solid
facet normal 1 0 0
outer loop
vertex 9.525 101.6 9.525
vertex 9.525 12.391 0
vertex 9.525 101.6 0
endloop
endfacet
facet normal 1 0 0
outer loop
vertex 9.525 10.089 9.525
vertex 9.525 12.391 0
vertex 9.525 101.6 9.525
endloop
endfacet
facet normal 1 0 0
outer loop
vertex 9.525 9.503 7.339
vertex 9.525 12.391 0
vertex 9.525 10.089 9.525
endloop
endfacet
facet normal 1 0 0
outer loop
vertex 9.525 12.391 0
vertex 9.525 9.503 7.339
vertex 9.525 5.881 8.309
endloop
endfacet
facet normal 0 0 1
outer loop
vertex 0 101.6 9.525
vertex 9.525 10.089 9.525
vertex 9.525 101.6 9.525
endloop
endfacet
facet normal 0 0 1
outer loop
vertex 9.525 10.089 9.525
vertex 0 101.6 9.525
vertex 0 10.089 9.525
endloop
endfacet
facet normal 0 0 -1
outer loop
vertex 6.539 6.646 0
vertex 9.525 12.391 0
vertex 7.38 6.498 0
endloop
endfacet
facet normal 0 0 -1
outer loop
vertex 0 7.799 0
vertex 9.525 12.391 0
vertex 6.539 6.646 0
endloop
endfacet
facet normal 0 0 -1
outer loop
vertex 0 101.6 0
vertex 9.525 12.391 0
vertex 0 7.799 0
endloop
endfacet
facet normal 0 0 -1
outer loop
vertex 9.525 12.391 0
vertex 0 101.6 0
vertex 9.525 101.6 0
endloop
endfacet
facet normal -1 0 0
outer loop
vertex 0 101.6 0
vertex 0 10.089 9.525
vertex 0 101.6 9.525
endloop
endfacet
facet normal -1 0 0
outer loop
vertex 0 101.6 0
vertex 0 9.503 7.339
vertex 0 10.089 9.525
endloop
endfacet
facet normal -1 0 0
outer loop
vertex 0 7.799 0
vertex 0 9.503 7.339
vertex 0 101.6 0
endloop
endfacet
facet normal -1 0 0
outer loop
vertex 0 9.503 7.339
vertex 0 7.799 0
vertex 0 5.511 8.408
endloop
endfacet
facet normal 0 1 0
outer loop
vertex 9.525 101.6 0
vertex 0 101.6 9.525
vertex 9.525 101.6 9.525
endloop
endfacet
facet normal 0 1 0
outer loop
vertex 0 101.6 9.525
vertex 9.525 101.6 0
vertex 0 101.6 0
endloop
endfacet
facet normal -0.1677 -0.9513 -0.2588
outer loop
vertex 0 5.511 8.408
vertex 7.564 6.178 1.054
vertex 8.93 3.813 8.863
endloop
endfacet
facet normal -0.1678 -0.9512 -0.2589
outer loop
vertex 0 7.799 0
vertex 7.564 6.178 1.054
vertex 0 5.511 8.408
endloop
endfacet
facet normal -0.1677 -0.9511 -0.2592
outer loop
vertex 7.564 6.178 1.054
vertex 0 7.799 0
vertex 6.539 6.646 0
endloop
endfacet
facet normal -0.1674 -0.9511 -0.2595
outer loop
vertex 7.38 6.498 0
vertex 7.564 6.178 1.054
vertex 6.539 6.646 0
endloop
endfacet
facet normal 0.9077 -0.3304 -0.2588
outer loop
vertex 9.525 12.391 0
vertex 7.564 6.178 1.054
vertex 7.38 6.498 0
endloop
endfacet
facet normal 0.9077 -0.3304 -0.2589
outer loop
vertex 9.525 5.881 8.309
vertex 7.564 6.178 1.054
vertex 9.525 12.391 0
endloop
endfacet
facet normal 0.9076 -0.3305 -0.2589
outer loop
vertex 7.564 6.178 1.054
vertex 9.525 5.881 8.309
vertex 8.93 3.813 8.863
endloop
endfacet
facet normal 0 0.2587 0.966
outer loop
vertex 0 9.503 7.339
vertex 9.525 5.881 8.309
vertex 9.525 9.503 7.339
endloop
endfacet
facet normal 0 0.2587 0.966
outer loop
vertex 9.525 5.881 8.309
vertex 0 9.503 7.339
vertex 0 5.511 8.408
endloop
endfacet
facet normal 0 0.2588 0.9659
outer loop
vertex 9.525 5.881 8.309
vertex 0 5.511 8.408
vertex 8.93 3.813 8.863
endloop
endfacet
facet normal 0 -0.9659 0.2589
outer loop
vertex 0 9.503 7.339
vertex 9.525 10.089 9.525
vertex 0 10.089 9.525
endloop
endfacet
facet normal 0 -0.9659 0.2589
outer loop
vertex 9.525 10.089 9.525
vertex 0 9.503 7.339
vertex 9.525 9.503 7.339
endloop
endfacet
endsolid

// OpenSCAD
// toolbit width in mm (default: 9.5 [3/8"])
$blank_h = 9.525; // [6.35:15.875]
// toolbit height in mm (default: 9.5 [3/8"])
$blank_v = 9.525; // [6.35:15.875]
// toolbit length in mm (default: 100 [4"])
$blank_len = 101.6; // [25:200]

// tool angles - see tool-angle-nomeclature.png


$side_rake = 10; //[0:35]
$side_cutting_edge = 20; // [0:35]
//$side_relief = 0; //[0:20]
$side_relief = 15; //[0:20]
$end_cutting_edge = 10; //[0:45]
//$end_relief = 15; //30; // [0:40]
$end_relief = 15;// [0:40]
$back_rake = 15; //5; // [-35:35]
$nose_radius = 0; // [0]

$face_len = $blank_h - ($blank_h / 5); // [0:15.875]

// see calc_face_coords for unrolling
function calc_face_near_y(h, v, clr, rake, face_len) =  (abs(tan(clr)) * (v + (abs(tan(rake)) * (abs(sin(rake)) * face_len)) + (abs(tan(clr)) * (abs(tan(clr)) * v))) - ((abs(tan(clr)) * v) + (abs(sin(rake)) * face_len) - v));
function calc_face_far_y(rake, face_len) =  (abs(tan(rake)) * face_len);

function calc_face_far_x(rake, face_len) = (abs(cos(rake)) * face_len);

module calc_face_coords(h, v, clr, rake, face_len) {
    y_off_clr = abs(tan(clr)) * v;
    z_off_clr = abs(tan(clr)) * y_off_clr;
    y_off_rake = abs(sin(rake)) * face_len;
    z_off_rake = abs(tan(rake)) * y_off_rake;
    new_y = y_off_clr + y_off_rake - v;
    new_z = v + z_off_rake + z_off_clr;
    near_y = (abs(tan(clr)) * new_z) - new_y; 
    far_y = (tan(rake)) * face_len;
    // NOTE: 0.5 is from front_face()   
    rv = [ [-0.5, 
        near_y],
      [-0.5 + (abs(cos(rake)) * face_len), 
       near_y + far_y]
    ];
}

function calc_face_y_offset(h, v, clr, rake) = ((abs(tan(clr)) * v) + (abs(tan(rake)) * h) - v);

function calc_face_z_offset(h, v, clr, rake) = (v + (abs(tan(rake)) * (abs(tan(rake)) * h)) + (abs(tan(clr)) * (abs(tan(clr)) * v)));
    
// Construct a basic rectangular toolbit
module basic_toolbit(h, v, length){
    cube([h, length, v]);
}

// Apply end-relief (front clearance) and
// end-cutting-edge (front rake)
module front_face(h, v, clr, rake) {
    /* DEBUG:
    tan_clr = abs(tan(clr));
    y_off_clr = tan_clr * v;
    z_off_clr = tan_clr * y_off_clr;
    
    tan_rake = abs(tan(rake));
    y_off_rake = tan_rake * h;
    z_off_rake = tan_rake * y_off_rake;
    new_y = -(y_off_clr + y_off_rake - v);
    new_z = v + z_off_rake + z_off_clr;
    */
            
    new_y = -calc_face_y_offset(h, v, clr, rake);
    new_z = calc_face_z_offset(h, v, clr, rake);
    
    translate([-2, new_y, new_z]) {

        rotate([clr, 0, rake]) {
            // padding: to account for rotation
            cube([h * 2, v * 2, v * 2]);
        };
    };
}

module side_cutting_edge_and_relief(near_x, near_y, far_x, far_y, h, v, rake, clr) {
    rake_comp = 360 - rake;
    
    echo(SIDE_X=(near_x + far_x), SIDE_Y=(near_y + far_y));
    translate([near_x + far_x, min(near_y, far_y), 0]) {
        //side_face(sz_h, sz_v, s_edge_comp, s_clr);
        rotate([0, clr, rake_comp]) {
        // padding: to account for rotation
            cube([h, v * 2, v * 2]);
        };
    };

}

// apply side-cutting-edge and side-relief
module side_face(h, v, rake, clr, f_clr, f_rake, face_len) {
    near_y = calc_face_near_y(h, v, f_clr, f_rake, face_len);
    far_y = calc_face_far_y(f_rake, face_len);
    near_x = -2;
    far_x = calc_face_far_x(f_rake, face_len);
    side_cutting_edge_and_relief(near_x, near_y, far_x, far_y, h, v, rake, clr);
}

// Apply back and side rake. 
// This uses values from calc_face_* .
module back_and_side_rake(near_x, near_y, far_x, far_y, h, v, b_rake, s_rake, s_edge) {
    s_edge_comp = 360 - s_edge;
    
    //adj = h - face_len;
    //opp = tan(s_edge) * adj;
    inner_x = far_x; //h; //near_x + h;
    inner_y = min(near_y, far_y) ; //+ (-opp);
    outer_y = max(near_y, far_y) ; 

    // back rake
    translate([0, inner_y, sz_v]) {
        rotate([-b_rake, 0, 0]) cube([sz_h, outer_y, sz_v]);
    }
    // side rake
    translate([inner_x, inner_y, v]) {
        rotate([0, s_rake, s_edge_comp]) {
            translate([0, 0, 0]) {
                //cube([sz_v, max(near_y, far_y), sz_h * 2]);
                // padding: to account for rotation
                ////cube([h,v*2, v * 2]);
            };
        };
    };

}

// apply back rake and side rake
module top_face(h, v, b_rake, f_clr, f_rake, s_rake, s_edge, face_len) {

    near_y = calc_face_near_y(h, v, f_clr, f_rake, face_len);
    far_y = calc_face_far_y(f_rake, face_len);
    near_x = 0;
    far_x = calc_face_far_x(f_rake, face_len);

    back_and_side_rake(near_x, near_y, far_x, far_y, h, v, b_rake, s_rake, s_edge);
    
    // FIXME: cube to clear top face
}


// Calls the above modules and functions to generate
// a lathe toolbit based on 
module standard_lathe_toolbit() {
    difference(){
        // cross section of toolbit in mm
        sz_h = $blank_h;
        sz_v = $blank_v;
        sz_len = $blank_len;
        f_clr = 180 + $end_relief;
        f_rake = 360 - $end_cutting_edge;
        s_clr = $side_relief;
        s_edge = $side_cutting_edge;
        s_rake = 270 - $side_rake;
        b_rake = $back_rake;
        face_len = min($face_len, sz_h); // sz_h - (sz_h / 5);
        
        basic_toolbit(sz_h, sz_v, sz_len);
    
        near_y = calc_face_near_y(sz_h, sz_v, f_clr, f_rake, face_len);
        far_y = calc_face_far_y(f_rake, face_len);
        near_x = -2; //0.5;
        far_x = calc_face_far_x(f_rake, face_len);

        /* // DEBUG
        // near_y = (tan(clr) * new_z) - new_y; 
        echo(Y_CLR_15=(tan(15) * sz_v), Y_RAKE_15=(sin(f_rake) * face_len));
        echo(Y_OFF_15=((tan(15) * sz_v) + (sin(f_rake) * face_len) - sz_v));
        echo(Y_CLR_30=(tan(30) * sz_v), Y_RAKE_30=(sin(f_rake) * face_len));
        echo(Y_OFF_30=((tan(30) * sz_v) + (sin(f_rake) * face_len) - sz_v));
        */
        
        echo(NEAR_Y=near_y, FAR_Y=far_y, FAR_X=far_x);
        // clear the unused front of the toolbit to prevent artifacts
        cube([sz_h, min(near_y, far_y), sz_v]);
        
        front_face(sz_h, sz_v, f_clr, f_rake);
  
        /* equivalent to:
        translate([near_x + far_x, near_y + far_y, 0]) {
              side_face(sz_h, sz_v, s_edge, s_clr, f_clr,   f_rake, face_len);
        }; */
        side_cutting_edge_and_relief(near_x, near_y, far_x, far_y, sz_h, sz_v, s_edge, s_clr);
    
        /* equivalent to:
         top_face(sz_h, sz_v, b_rake, f_clr, f_rake, s_rake, s_edge_comp, face_len); */
        back_and_side_rake(near_x, near_y, far_x, far_y, sz_h, sz_v, b_rake, s_rake, s_edge);
    };
}

// main():
standard_lathe_toolbit();

/* // DEBUG TOP FACE
// TESTBED
//opp = tan($side_cutting_edge) * ($blank_h - $face_len);
inner_x = calc_face_far_x($end_cutting_edge, $face_len); 
// clear front of tool bit
inner_y = calc_face_near_y($blank_h, $blank_v, $end_relief, $end_cutting_edge, $face_len) + calc_face_far_y($end_cutting_edge, $face_len); 

//translate([0, inner, 0]) cube([$blank_h, inner_y, $blank_v]);
//cube([$blank_h, -inner_y, $blank_v]);

translate([inner_x, -inner_y, $blank_v]) {
    rotate([0, $side_rake, $side_cutting_edge]) {
        // padding: to account for rotation
        //cube([$blank_h/2,$blank_v*2, $blank_v]);
    };
};
*/

/*  // DEBUG FRONT FACE
    f_clr = 180 + $end_relief;
    f_rake = 360 - $end_cutting_edge;

    tan_clr = abs(tan(f_clr));
    y_off_clr = tan_clr * $blank_v;
    z_off_clr = tan_clr * y_off_clr;
    echo(Z_OFF_C=z_off_rake, Y_OFF_C=y_off_rake, TAN=tan_rake);
    
    tan_rake = abs(tan(f_rake));
    y_off_rake = tan_rake * $blank_h;
    z_off_rake = tan_rake * y_off_rake;
    echo(Z_OFF_R=z_off_rake, Y_OFF_R=y_off_rake, TAN=tan_rake);

    
    // NEW Z is too low!
    new_y = -(y_off_clr + y_off_rake - $blank_v) ;
    new_z = $blank_v + z_off_rake + z_off_clr ;
    echo(Z=new_z)

    translate([-2, new_y, new_z]) {

        rotate([f_clr, 0, f_rake]) {
            // padding: to account for rotation
            //cube([$blank_h * 2, $blank_v * 2, $blank_v * 2]);
        };
    };
    */

        sz_h = $blank_h;
        sz_v = $blank_v;
        sz_len = $blank_len;
        f_clr = 180 + $end_relief;
        f_rake = 360 - $end_cutting_edge;
        s_clr = $side_relief;
        s_edge = $side_cutting_edge;
        s_rake = 270 - $side_rake;
        b_rake = $back_rake;
        face_len = sz_h - (sz_h / 5);    
    s_edge_comp = 360 - s_edge;
    
    //adj = h - face_len;
    //opp = tan(s_edge) * adj;
    near_y = calc_face_near_y(sz_h, sz_v, f_clr, f_rake, face_len);
    far_y = calc_face_far_y(f_rake, face_len);
    near_x = 0;
    
    far_x = calc_face_far_x(f_rake, face_len);
    echo(FAR_X=far_x, RAKE=f_rake, LEN=face_len);
   
    ang = f_rake; // WRONG
    
    echo(ANG=ang, TAN=abs(tan(ang)), X=(sz_h - far_x));
    inner_x = ((sz_h - far_x) / abs(tan(ang)));
    echo(INNER_X=inner_x, FAR_X=far_x);
    //inner_x = far_x; //h; //near_x + h;
    inner_y = min(near_y, far_y) ; //+ (-opp);
    outer_y = max(near_y, far_y) ; 

    /*translate([0, inner_y, sz_v]) {
        rotate([-b_rake, 0, 0]) cube([sz_h, outer_y, sz_v]);
    }*/
    translate([inner_x + 1, inner_y, sz_v]) {
        rotate([0, s_rake, s_edge_comp]) {
            translate([0, 0, 0]) {
                // padding: to account for rotation
                //cube([sz_h, sz_v*2, sz_v * 2]);
                //cube([sz_v, max(near_y, far_y) , sz_h * 2]);
            };
        };
    };

/*
    side cutting edge 
    side relief 15
    end cutting edge 80
    end relief 15
    back rake 15-18
    side rake 20
    face_len ?
    node radius 1/64
*/
